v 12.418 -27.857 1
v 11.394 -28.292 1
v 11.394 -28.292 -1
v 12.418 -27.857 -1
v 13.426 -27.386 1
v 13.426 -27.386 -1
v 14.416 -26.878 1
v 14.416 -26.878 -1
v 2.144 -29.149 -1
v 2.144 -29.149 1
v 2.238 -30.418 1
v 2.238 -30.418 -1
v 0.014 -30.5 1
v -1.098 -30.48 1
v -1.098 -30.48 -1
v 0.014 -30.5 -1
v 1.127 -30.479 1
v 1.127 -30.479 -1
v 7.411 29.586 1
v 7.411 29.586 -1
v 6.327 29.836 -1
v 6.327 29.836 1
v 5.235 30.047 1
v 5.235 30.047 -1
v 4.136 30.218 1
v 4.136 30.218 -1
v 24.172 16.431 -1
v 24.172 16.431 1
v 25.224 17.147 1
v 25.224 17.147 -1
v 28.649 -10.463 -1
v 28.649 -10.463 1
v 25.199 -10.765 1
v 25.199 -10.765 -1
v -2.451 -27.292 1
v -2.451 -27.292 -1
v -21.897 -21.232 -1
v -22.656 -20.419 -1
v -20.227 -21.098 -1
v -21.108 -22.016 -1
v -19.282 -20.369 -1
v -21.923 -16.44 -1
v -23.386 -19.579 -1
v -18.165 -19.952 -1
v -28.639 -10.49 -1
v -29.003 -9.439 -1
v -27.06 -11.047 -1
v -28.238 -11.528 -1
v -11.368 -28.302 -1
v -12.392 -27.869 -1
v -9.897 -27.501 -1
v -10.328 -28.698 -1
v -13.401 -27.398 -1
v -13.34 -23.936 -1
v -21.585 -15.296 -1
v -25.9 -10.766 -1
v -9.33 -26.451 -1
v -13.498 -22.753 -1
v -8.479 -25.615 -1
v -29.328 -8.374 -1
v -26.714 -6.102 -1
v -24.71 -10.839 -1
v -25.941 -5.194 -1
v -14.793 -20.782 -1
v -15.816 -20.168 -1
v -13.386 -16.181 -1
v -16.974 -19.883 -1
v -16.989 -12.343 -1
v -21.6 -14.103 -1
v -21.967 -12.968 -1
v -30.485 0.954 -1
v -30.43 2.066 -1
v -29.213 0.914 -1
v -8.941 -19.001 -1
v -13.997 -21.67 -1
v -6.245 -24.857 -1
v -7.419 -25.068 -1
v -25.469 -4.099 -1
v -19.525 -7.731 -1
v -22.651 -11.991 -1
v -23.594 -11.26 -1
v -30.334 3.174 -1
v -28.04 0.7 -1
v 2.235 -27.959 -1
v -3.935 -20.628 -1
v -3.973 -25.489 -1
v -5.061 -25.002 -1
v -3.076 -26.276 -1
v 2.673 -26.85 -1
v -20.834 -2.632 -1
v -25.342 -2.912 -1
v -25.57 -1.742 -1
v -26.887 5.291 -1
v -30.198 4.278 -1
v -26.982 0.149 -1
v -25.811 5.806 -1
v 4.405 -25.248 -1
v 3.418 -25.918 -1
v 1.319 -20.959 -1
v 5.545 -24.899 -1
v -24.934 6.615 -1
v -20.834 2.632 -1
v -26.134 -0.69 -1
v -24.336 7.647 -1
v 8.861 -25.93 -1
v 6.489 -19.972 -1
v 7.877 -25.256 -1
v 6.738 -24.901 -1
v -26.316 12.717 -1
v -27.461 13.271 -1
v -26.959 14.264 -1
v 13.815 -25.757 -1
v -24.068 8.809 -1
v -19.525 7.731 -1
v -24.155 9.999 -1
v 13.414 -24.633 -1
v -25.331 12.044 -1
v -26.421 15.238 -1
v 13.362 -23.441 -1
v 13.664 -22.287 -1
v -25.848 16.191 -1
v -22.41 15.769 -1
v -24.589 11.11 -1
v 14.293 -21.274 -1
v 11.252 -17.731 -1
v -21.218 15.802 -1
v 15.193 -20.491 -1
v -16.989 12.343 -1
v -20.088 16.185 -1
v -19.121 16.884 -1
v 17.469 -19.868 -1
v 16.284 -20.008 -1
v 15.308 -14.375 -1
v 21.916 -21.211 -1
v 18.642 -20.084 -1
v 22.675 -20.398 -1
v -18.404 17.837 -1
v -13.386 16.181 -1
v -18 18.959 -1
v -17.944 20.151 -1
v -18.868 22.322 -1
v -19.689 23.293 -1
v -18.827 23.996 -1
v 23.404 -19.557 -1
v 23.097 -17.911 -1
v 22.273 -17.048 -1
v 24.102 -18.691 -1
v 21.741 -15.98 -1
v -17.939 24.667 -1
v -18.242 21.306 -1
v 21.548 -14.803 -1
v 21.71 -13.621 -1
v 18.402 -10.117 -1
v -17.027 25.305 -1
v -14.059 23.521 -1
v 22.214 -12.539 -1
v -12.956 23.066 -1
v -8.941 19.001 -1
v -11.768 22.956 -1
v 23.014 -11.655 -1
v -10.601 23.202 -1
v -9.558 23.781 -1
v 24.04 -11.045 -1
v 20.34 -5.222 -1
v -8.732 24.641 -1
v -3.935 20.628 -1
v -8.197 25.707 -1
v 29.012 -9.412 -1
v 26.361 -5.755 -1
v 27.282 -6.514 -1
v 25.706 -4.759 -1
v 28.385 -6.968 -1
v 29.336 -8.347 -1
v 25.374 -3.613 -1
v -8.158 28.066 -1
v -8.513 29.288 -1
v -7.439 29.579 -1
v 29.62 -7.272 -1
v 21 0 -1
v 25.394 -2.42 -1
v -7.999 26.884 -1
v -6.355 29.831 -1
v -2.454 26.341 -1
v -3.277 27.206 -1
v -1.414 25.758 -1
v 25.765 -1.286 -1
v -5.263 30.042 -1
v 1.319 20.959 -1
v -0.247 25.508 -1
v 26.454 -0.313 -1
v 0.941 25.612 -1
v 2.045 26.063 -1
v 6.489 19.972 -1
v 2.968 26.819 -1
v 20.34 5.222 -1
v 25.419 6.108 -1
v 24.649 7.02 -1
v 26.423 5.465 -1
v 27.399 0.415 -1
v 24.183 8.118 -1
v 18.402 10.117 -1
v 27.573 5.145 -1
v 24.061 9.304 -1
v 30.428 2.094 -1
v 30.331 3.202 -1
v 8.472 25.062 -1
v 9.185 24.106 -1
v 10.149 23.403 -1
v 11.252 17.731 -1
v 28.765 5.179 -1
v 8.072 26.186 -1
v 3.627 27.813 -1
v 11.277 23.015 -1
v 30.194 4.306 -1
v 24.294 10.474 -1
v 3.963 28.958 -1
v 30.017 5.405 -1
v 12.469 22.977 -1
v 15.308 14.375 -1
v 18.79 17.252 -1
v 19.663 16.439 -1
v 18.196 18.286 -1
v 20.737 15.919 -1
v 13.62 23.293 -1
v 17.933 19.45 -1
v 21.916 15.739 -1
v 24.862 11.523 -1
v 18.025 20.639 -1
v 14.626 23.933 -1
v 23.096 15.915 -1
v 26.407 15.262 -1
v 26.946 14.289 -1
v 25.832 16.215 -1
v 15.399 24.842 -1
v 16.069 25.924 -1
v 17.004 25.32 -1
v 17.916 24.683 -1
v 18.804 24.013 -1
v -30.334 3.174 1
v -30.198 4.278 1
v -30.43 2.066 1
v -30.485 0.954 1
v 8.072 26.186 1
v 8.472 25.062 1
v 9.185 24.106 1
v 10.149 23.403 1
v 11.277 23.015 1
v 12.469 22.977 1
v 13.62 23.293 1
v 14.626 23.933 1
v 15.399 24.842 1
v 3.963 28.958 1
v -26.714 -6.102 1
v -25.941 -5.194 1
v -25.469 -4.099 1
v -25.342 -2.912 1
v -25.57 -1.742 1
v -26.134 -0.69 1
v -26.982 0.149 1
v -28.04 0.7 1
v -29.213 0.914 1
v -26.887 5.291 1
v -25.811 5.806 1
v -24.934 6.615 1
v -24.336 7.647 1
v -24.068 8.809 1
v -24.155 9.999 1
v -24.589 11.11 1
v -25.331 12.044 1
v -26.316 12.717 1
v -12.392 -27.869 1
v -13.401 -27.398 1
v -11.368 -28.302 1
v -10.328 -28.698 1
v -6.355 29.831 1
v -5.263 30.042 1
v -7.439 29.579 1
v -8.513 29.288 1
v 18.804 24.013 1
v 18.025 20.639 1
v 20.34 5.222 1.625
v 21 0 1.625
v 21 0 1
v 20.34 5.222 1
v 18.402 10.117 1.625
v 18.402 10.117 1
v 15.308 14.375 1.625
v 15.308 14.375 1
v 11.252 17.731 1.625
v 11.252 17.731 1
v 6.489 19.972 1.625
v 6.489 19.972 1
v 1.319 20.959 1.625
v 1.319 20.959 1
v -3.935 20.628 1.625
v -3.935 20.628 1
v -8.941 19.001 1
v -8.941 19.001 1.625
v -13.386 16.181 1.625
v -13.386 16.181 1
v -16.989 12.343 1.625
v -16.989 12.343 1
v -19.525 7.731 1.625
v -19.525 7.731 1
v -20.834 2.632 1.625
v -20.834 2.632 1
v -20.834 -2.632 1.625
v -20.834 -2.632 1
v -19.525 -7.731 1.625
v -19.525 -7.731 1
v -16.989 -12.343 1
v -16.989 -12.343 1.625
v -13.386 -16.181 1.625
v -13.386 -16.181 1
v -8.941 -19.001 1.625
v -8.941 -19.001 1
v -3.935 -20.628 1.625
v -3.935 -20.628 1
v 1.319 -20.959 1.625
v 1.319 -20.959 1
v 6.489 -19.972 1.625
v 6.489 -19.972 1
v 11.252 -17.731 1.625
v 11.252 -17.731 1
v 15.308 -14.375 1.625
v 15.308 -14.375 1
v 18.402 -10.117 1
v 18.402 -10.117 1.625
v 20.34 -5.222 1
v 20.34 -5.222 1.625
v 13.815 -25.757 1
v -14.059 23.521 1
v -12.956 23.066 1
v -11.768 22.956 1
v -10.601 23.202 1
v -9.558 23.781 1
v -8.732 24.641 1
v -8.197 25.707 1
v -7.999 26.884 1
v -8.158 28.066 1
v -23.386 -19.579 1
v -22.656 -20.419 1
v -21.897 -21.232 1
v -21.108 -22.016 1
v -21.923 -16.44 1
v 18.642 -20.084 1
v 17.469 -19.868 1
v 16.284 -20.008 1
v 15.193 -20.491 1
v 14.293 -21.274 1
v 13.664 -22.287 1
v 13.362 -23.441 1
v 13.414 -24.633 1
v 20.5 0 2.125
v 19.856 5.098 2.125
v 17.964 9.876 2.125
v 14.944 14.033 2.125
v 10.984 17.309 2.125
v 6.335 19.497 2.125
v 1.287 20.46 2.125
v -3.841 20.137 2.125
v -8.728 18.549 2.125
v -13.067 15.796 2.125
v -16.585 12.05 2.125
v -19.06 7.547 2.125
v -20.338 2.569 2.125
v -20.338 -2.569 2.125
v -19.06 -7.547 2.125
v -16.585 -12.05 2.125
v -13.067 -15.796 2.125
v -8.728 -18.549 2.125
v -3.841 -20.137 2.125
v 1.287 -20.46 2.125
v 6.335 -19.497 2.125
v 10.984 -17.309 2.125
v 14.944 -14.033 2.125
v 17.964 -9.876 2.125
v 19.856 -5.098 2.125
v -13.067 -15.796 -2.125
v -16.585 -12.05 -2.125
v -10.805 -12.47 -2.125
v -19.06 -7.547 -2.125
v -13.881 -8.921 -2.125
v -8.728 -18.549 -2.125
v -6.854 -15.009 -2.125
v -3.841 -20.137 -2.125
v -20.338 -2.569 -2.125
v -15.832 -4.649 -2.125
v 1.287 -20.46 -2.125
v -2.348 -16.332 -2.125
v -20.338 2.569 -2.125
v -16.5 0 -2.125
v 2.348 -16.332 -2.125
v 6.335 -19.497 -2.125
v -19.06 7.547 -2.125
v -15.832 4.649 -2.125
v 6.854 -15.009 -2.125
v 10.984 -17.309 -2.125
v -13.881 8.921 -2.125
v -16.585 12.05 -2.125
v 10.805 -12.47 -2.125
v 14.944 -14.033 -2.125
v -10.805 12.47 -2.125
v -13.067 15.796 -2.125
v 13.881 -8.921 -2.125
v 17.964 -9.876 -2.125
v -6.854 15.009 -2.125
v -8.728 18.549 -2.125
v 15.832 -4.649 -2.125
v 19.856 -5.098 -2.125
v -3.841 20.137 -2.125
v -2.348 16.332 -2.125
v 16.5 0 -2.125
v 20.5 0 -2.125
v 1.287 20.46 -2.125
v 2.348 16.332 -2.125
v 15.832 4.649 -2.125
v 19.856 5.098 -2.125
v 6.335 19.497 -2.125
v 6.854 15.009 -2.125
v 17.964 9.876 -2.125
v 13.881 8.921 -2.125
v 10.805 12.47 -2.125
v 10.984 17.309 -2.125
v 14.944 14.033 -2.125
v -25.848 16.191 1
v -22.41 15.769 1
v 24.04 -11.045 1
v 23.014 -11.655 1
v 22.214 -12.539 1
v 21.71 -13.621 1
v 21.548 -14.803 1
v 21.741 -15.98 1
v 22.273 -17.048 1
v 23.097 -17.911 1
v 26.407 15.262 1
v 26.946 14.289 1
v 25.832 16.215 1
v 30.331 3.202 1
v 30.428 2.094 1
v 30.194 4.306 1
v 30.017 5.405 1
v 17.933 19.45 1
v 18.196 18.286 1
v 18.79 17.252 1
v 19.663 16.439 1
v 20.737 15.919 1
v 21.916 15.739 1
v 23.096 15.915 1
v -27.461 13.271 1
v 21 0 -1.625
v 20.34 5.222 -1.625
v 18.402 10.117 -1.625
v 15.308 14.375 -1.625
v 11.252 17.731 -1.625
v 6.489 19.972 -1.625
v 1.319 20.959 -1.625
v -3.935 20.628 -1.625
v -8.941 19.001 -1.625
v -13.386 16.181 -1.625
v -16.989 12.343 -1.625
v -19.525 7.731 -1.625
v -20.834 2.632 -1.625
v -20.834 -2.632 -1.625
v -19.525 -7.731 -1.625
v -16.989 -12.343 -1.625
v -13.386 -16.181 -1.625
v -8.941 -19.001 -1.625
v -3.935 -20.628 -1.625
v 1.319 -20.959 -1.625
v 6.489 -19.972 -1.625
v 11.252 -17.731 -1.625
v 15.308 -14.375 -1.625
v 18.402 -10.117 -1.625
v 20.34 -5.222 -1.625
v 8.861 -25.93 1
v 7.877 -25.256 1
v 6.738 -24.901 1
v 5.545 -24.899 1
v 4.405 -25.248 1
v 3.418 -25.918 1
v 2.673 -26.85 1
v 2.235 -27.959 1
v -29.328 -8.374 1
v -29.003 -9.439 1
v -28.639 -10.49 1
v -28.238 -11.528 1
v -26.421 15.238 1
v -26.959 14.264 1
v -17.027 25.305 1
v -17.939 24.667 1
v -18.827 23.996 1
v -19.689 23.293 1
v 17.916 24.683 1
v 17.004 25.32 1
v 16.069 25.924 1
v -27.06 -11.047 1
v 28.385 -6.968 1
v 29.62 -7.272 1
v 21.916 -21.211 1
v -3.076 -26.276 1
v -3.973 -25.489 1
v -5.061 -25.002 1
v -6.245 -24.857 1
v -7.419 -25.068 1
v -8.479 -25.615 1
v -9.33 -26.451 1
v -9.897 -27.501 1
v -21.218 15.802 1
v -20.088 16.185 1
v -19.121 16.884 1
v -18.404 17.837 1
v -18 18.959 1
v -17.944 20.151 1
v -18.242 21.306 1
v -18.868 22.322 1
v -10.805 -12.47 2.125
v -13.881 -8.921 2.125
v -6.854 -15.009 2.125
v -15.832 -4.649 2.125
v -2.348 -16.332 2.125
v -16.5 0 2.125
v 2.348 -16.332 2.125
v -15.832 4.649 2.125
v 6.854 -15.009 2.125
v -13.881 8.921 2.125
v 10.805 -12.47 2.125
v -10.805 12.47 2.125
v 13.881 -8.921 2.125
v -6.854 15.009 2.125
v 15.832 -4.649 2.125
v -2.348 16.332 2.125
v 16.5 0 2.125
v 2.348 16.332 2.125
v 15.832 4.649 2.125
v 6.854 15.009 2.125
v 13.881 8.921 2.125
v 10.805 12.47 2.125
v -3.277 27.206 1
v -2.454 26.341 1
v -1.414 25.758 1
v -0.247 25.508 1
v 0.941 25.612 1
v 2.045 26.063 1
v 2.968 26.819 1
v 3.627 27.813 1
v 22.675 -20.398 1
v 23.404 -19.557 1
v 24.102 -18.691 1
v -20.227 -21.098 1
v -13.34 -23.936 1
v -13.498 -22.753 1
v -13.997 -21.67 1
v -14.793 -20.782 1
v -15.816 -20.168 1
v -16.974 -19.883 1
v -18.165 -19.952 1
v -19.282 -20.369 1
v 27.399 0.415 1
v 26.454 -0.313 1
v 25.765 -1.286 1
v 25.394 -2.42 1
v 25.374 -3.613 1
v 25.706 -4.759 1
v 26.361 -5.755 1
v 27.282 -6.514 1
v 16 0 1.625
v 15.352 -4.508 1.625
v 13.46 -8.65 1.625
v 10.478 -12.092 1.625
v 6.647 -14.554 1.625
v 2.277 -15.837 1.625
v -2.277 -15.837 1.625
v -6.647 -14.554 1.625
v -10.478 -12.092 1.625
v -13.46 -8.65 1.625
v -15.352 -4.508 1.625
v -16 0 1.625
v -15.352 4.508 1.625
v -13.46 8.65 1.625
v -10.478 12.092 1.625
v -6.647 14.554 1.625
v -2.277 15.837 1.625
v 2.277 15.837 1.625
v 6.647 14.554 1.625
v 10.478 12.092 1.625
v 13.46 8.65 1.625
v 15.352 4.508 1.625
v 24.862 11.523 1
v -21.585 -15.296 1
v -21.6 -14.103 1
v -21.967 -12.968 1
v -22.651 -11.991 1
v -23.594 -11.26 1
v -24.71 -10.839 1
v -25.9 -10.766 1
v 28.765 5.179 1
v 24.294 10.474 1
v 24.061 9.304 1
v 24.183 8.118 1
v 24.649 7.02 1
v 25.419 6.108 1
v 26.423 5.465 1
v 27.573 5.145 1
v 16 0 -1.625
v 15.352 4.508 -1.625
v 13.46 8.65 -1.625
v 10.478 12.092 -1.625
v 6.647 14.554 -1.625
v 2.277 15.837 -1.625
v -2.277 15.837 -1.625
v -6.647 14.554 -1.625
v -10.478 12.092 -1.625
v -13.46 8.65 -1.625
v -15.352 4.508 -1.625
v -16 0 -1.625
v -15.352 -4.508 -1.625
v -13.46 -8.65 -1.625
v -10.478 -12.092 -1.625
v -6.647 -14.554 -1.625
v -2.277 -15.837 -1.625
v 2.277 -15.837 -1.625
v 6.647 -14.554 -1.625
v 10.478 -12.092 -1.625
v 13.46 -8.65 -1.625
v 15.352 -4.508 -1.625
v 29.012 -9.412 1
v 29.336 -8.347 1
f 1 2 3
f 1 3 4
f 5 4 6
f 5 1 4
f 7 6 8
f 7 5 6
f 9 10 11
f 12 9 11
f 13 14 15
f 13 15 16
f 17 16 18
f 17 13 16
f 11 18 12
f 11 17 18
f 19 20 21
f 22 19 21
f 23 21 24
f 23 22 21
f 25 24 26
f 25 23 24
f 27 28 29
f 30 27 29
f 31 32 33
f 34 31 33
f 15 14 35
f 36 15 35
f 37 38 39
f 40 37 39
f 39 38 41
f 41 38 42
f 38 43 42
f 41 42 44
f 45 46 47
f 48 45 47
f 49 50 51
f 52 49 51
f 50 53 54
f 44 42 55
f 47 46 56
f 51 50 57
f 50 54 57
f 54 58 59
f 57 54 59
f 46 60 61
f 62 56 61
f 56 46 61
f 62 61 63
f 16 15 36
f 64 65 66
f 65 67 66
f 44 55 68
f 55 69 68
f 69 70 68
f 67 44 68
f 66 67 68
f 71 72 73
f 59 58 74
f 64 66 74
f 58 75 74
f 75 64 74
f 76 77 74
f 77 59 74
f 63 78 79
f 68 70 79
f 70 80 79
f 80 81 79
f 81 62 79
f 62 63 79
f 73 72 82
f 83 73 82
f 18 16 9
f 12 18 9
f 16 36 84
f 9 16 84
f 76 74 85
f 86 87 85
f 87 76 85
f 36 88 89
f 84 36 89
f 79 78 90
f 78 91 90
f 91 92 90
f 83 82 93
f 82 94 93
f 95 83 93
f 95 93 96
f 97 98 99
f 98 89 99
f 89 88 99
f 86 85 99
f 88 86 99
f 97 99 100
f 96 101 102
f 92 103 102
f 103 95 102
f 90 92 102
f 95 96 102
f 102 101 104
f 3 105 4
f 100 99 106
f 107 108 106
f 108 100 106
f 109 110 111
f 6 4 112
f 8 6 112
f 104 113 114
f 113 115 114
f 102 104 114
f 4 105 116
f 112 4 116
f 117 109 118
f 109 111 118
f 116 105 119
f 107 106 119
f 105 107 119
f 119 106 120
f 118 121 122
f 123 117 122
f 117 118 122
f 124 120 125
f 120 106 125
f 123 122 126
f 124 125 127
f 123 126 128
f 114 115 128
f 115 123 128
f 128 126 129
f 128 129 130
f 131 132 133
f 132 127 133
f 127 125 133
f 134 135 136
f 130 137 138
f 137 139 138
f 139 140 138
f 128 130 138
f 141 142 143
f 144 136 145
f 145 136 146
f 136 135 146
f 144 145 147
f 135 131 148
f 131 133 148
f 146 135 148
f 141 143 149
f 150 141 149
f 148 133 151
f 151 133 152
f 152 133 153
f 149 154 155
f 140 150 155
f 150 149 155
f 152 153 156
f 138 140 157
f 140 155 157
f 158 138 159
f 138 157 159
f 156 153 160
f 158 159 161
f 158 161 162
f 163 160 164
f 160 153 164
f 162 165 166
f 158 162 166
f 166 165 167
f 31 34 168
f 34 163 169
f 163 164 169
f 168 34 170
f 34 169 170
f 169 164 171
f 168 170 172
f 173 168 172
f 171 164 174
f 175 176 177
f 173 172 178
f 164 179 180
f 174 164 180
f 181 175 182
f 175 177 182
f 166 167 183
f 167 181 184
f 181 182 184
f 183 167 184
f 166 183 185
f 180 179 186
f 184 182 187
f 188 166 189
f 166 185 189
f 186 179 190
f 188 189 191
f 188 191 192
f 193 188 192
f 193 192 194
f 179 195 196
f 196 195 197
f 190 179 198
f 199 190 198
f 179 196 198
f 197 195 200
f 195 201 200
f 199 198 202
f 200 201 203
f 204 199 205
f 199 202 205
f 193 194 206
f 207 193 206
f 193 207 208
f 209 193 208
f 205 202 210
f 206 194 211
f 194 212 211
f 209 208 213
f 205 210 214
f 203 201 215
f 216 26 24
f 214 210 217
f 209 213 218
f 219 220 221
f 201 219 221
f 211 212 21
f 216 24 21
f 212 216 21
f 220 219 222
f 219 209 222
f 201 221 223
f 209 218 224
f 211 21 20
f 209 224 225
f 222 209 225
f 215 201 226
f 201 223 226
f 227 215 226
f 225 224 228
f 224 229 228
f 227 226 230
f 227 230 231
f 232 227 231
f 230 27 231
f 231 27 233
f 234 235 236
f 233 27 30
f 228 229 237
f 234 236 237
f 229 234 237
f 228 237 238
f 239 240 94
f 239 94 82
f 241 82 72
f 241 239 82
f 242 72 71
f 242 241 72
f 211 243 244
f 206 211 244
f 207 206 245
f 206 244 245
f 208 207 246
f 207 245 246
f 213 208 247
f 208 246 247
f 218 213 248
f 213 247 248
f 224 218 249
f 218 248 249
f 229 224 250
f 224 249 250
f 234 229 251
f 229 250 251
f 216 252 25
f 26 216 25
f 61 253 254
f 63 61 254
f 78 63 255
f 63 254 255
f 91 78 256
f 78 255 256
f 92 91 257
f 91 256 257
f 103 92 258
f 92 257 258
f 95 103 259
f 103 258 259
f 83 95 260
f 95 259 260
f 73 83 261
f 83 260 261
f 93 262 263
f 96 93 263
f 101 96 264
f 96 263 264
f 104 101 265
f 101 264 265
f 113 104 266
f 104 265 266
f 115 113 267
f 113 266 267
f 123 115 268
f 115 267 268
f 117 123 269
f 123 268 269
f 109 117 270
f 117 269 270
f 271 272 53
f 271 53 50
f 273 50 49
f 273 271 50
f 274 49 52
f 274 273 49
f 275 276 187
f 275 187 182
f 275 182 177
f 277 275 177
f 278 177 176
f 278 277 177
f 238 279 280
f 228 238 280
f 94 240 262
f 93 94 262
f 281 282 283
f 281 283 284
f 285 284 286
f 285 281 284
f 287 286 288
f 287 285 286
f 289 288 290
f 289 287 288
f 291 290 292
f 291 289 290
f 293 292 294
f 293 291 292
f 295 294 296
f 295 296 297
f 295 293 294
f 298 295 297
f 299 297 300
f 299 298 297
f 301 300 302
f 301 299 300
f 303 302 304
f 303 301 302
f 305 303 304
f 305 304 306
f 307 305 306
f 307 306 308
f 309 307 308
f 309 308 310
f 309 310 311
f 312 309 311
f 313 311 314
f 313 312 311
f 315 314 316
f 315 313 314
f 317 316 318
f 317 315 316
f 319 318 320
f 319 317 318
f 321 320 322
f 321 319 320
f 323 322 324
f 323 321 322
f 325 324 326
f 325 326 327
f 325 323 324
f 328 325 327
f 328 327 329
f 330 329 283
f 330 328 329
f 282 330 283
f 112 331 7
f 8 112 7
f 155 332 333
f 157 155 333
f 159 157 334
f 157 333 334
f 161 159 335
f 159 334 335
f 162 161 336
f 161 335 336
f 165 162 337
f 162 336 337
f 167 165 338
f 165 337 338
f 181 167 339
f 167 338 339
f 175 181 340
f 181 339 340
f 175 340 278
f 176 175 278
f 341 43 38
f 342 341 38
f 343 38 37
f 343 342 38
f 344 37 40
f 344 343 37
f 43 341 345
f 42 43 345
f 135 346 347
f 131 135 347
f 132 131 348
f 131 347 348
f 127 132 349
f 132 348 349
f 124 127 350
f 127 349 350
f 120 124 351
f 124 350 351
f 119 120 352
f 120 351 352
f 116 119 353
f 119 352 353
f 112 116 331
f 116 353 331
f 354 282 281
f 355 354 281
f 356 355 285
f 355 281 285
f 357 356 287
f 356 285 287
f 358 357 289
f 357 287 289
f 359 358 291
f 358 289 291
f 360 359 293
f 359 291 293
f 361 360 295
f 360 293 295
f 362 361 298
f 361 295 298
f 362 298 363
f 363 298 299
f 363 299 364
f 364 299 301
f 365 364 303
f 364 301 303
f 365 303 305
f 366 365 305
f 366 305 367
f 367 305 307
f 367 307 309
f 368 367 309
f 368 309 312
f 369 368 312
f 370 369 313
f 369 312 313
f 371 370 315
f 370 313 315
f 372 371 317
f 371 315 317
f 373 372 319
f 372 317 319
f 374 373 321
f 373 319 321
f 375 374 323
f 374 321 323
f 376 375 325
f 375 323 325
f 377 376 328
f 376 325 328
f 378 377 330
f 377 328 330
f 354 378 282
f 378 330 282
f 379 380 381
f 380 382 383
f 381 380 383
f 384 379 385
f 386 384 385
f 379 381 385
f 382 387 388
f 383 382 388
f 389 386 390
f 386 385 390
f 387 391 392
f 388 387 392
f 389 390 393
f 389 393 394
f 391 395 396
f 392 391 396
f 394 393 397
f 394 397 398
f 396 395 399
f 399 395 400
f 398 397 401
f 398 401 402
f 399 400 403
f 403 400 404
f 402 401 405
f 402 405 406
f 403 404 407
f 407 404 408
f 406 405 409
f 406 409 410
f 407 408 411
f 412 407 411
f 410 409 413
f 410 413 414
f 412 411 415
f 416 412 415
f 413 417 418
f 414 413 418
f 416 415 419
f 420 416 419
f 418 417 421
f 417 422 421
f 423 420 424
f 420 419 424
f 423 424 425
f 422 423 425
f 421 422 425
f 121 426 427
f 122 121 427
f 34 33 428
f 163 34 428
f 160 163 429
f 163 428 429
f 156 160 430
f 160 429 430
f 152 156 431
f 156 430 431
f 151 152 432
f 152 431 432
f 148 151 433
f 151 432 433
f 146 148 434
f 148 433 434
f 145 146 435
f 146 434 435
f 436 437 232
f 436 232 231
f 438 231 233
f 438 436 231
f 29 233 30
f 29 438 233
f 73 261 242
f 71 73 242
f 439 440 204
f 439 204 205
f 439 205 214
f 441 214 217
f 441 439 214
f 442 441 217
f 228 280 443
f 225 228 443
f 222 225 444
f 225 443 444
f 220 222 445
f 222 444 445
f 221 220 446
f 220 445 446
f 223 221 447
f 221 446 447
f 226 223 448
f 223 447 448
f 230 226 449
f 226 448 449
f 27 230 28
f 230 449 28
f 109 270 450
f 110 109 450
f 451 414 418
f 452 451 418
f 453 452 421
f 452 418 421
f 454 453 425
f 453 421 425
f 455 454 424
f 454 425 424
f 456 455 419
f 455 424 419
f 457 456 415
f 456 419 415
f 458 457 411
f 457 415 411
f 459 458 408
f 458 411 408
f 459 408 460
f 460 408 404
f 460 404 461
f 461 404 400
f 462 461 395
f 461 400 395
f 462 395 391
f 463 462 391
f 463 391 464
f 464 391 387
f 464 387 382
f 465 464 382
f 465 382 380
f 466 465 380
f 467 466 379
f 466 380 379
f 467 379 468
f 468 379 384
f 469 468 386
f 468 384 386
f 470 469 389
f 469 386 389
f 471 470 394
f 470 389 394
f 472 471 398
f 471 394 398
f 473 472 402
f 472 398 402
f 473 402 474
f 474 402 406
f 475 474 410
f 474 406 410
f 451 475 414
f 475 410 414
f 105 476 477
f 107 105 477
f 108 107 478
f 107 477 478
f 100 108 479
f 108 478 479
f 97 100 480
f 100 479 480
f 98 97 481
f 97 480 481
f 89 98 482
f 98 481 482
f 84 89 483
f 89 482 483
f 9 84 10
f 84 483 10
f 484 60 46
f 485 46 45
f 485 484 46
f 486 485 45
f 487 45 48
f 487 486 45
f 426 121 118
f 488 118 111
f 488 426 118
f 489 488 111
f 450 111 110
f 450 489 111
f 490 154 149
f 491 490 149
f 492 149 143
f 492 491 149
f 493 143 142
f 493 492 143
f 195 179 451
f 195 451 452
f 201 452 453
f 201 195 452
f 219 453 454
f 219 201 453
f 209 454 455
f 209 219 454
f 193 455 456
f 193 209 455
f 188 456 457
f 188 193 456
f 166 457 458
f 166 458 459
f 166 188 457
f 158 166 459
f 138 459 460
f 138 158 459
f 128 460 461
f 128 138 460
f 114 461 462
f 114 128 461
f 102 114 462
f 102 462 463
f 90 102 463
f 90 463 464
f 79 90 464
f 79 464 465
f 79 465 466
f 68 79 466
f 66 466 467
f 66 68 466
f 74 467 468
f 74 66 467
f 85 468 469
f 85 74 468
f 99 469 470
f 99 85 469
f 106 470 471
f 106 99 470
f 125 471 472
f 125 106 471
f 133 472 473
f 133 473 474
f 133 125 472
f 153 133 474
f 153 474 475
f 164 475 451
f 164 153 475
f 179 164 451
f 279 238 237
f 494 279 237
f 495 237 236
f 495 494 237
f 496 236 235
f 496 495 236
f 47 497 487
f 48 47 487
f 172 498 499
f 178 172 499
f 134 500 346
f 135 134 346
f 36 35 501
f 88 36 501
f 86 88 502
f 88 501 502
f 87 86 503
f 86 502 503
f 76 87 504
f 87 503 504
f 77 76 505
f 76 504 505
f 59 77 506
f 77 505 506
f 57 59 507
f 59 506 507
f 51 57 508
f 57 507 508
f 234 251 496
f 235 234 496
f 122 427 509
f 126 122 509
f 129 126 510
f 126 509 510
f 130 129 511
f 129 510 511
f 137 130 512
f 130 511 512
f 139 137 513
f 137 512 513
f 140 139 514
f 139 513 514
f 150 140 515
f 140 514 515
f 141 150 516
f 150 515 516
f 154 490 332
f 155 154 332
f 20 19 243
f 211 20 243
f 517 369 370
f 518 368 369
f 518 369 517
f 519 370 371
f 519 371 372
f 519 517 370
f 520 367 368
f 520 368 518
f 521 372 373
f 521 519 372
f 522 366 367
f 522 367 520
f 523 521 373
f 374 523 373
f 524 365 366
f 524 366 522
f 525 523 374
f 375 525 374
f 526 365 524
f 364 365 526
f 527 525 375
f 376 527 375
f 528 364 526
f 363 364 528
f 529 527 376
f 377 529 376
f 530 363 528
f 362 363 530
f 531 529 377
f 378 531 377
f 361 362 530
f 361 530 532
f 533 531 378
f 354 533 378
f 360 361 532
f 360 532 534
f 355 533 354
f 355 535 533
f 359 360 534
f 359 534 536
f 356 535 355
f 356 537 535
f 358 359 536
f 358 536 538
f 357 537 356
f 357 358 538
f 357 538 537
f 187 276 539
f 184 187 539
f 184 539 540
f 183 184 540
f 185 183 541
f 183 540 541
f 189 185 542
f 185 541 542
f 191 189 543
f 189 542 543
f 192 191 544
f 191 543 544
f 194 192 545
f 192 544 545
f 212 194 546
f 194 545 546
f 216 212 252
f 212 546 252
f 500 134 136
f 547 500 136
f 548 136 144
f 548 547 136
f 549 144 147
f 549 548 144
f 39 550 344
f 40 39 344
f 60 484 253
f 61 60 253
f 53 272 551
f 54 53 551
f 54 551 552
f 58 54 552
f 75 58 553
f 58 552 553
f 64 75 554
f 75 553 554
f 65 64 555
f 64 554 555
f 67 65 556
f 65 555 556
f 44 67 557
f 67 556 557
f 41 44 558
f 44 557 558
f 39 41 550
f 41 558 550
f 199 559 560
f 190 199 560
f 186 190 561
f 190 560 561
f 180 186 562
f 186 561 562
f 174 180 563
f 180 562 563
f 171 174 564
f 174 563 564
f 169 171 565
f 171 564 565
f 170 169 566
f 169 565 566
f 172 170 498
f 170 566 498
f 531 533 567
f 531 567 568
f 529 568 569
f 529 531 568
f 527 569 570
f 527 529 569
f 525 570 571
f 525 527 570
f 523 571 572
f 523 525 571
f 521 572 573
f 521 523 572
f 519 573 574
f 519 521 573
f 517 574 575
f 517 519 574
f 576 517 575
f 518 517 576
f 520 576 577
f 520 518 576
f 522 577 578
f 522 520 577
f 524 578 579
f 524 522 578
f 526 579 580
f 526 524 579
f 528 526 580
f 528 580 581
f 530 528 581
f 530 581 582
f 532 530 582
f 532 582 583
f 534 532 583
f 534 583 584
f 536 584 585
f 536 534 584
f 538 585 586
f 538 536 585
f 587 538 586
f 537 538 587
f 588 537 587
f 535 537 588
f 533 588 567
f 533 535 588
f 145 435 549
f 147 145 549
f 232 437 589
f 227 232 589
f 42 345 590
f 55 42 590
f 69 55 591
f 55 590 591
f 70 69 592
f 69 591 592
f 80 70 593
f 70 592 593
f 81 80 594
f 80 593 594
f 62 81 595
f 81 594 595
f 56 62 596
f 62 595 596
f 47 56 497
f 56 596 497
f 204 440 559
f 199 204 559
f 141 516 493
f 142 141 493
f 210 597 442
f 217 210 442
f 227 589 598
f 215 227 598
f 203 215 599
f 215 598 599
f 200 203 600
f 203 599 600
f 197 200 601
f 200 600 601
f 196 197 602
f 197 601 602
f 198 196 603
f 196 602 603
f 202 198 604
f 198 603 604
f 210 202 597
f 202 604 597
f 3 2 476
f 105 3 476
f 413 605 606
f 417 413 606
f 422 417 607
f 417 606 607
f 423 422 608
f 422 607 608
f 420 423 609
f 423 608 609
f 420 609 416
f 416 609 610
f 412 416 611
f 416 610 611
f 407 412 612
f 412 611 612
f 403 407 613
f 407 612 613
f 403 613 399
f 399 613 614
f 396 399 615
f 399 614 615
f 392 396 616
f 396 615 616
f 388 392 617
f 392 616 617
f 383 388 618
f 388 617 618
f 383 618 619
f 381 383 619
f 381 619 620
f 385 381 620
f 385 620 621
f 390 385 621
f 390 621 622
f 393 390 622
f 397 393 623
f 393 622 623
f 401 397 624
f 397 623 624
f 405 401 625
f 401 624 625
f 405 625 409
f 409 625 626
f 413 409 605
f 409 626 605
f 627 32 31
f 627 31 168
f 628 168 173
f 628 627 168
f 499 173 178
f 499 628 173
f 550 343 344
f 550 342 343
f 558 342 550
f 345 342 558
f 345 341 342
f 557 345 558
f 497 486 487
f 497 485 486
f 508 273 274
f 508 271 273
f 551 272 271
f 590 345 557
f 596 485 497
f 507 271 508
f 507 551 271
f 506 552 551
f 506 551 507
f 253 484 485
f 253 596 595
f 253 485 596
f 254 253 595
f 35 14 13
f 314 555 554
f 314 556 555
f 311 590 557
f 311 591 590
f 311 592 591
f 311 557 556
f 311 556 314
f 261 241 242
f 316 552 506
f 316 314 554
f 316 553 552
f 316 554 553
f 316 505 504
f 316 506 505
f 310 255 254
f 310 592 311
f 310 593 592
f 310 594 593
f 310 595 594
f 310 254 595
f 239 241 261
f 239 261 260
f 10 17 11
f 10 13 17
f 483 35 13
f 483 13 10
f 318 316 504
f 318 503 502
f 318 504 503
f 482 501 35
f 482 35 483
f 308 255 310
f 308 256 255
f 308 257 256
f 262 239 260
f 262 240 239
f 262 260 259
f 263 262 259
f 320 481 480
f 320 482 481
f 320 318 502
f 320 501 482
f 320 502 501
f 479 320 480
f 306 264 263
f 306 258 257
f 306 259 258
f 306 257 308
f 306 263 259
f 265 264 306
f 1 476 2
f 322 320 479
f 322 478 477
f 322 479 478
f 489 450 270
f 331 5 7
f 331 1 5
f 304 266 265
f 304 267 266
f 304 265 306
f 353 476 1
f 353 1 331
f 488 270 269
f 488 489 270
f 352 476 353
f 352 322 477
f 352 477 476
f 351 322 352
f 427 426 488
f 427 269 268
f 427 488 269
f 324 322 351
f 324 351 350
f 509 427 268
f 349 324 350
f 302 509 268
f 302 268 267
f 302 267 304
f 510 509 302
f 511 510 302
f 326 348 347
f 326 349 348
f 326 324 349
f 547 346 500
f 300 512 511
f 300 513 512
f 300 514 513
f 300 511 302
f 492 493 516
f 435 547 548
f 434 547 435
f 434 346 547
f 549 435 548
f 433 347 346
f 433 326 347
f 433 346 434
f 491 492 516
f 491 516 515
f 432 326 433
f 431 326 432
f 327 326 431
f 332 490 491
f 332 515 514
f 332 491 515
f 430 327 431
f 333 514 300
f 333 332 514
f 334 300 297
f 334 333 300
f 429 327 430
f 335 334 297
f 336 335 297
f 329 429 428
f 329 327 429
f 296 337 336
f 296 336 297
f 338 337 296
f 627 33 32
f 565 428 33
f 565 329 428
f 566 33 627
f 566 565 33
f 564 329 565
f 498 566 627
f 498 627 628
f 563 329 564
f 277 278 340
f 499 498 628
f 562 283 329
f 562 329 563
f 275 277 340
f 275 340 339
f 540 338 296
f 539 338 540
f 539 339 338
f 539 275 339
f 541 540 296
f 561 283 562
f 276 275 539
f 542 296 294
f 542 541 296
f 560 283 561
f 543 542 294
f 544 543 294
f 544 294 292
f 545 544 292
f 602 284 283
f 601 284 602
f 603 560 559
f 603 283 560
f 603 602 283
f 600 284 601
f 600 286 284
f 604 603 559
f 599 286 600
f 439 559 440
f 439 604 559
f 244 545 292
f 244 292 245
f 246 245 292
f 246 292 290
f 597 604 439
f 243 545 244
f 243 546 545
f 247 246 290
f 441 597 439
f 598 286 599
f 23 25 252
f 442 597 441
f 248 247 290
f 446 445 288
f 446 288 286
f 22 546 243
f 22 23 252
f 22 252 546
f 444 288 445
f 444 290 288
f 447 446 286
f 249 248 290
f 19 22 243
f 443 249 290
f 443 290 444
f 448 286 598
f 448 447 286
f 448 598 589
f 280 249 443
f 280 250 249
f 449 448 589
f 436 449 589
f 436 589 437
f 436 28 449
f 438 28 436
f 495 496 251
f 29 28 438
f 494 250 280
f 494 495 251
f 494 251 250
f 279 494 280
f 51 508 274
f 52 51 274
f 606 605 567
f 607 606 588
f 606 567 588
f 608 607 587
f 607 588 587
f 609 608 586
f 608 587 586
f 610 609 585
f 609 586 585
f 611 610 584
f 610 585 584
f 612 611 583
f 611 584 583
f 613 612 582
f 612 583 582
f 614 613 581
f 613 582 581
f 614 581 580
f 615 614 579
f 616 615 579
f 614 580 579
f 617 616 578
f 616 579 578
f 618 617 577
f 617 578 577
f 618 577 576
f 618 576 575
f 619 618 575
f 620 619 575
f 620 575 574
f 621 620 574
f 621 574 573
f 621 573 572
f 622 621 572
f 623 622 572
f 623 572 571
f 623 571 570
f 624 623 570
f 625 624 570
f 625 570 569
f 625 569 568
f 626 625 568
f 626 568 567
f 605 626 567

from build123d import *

# Parameters (mm, degrees)
ESQUISSE1_R                  = 30.5
EXTRUSION1_DEPTH             = 1
ENL_V_MAT_EXTRU_1_DEPTH      = 2
R_P_TITION_CIRCULAIRE1_COUNT = 15
ESQUISSE3_R                  = 21
EXTRUSION2_DEPTH             = 2.125
ESQUISSE4_R                  = 16
ENL_V_MAT_EXTRU_2_DEPTH      = 3.125
ENL_V_MAT_EXTRU_2_DEPTH_BACK = 3.125
CHANFREIN1_SIZE              = 0.5


with BuildPart() as part:
    # Esquisse1 → Extrusion1 (new body, symmetric)
    with BuildSketch(Plane.XY):
        Circle(ESQUISSE1_R)
    extrude(amount=EXTRUSION1_DEPTH, both=True)

    # Esquisse2 → Enlèv. mat.-Extru.1 (cut, symmetric)
    with BuildSketch(Plane.XY):
        with BuildLine():
            Line((-5.262955088, 30.042491637), (-3.276608177, 27.205694255))
            ThreePointArc((-3.276608177, 27.205694255), (0.940808513, 25.612214082), (3.963058372, 28.957627119))
            Line((3.963058372, 28.957627119), (4.13559322, 30.218320084))
            ThreePointArc((4.13559322, 30.218320084), (-0.570495492, 30.49466404), (-5.262955088, 30.042491637))
        make_face()
    enl_v_mat_extru_1 = extrude(amount=ENL_V_MAT_EXTRU_1_DEPTH, both=True, mode=Mode.SUBTRACT)

    # Répétition circulaire1: Enlèv. mat.-Extru.1 ×15 about axis
    r_p_tition_circulaire1_axis = Axis((0, 0, 0), (0, 0, 1))
    for i in range(1, R_P_TITION_CIRCULAIRE1_COUNT):
        add(enl_v_mat_extru_1.rotate(r_p_tition_circulaire1_axis, i * 360 / R_P_TITION_CIRCULAIRE1_COUNT), mode=Mode.SUBTRACT)

    # Esquisse3 → Extrusion2 (add, symmetric)
    with BuildSketch(Plane.XY):
        Circle(ESQUISSE3_R)
    extrude(amount=EXTRUSION2_DEPTH, both=True)

    # Esquisse4 → Enlèv. mat.-Extru.2 (cut, two sides)
    with BuildSketch(Plane.XY) as enl_v_mat_extru_2_sk:
        Circle(ESQUISSE4_R)
    extrude(amount=ENL_V_MAT_EXTRU_2_DEPTH, mode=Mode.SUBTRACT)
    extrude(enl_v_mat_extru_2_sk.sketch, amount=-ENL_V_MAT_EXTRU_2_DEPTH_BACK, mode=Mode.SUBTRACT)

    # Chanfrein1
    chanfrein1_edges = [part.edges().sort_by_distance(p)[0] for p in [
        (-21, 0, -2.125),
        (-21, 0, 2.125),
        (-16, 0, -2.125),
        (-16, 0, 2.125),
    ]]
    chamfer(chanfrein1_edges, length=CHANFREIN1_SIZE)


solid = part.part
